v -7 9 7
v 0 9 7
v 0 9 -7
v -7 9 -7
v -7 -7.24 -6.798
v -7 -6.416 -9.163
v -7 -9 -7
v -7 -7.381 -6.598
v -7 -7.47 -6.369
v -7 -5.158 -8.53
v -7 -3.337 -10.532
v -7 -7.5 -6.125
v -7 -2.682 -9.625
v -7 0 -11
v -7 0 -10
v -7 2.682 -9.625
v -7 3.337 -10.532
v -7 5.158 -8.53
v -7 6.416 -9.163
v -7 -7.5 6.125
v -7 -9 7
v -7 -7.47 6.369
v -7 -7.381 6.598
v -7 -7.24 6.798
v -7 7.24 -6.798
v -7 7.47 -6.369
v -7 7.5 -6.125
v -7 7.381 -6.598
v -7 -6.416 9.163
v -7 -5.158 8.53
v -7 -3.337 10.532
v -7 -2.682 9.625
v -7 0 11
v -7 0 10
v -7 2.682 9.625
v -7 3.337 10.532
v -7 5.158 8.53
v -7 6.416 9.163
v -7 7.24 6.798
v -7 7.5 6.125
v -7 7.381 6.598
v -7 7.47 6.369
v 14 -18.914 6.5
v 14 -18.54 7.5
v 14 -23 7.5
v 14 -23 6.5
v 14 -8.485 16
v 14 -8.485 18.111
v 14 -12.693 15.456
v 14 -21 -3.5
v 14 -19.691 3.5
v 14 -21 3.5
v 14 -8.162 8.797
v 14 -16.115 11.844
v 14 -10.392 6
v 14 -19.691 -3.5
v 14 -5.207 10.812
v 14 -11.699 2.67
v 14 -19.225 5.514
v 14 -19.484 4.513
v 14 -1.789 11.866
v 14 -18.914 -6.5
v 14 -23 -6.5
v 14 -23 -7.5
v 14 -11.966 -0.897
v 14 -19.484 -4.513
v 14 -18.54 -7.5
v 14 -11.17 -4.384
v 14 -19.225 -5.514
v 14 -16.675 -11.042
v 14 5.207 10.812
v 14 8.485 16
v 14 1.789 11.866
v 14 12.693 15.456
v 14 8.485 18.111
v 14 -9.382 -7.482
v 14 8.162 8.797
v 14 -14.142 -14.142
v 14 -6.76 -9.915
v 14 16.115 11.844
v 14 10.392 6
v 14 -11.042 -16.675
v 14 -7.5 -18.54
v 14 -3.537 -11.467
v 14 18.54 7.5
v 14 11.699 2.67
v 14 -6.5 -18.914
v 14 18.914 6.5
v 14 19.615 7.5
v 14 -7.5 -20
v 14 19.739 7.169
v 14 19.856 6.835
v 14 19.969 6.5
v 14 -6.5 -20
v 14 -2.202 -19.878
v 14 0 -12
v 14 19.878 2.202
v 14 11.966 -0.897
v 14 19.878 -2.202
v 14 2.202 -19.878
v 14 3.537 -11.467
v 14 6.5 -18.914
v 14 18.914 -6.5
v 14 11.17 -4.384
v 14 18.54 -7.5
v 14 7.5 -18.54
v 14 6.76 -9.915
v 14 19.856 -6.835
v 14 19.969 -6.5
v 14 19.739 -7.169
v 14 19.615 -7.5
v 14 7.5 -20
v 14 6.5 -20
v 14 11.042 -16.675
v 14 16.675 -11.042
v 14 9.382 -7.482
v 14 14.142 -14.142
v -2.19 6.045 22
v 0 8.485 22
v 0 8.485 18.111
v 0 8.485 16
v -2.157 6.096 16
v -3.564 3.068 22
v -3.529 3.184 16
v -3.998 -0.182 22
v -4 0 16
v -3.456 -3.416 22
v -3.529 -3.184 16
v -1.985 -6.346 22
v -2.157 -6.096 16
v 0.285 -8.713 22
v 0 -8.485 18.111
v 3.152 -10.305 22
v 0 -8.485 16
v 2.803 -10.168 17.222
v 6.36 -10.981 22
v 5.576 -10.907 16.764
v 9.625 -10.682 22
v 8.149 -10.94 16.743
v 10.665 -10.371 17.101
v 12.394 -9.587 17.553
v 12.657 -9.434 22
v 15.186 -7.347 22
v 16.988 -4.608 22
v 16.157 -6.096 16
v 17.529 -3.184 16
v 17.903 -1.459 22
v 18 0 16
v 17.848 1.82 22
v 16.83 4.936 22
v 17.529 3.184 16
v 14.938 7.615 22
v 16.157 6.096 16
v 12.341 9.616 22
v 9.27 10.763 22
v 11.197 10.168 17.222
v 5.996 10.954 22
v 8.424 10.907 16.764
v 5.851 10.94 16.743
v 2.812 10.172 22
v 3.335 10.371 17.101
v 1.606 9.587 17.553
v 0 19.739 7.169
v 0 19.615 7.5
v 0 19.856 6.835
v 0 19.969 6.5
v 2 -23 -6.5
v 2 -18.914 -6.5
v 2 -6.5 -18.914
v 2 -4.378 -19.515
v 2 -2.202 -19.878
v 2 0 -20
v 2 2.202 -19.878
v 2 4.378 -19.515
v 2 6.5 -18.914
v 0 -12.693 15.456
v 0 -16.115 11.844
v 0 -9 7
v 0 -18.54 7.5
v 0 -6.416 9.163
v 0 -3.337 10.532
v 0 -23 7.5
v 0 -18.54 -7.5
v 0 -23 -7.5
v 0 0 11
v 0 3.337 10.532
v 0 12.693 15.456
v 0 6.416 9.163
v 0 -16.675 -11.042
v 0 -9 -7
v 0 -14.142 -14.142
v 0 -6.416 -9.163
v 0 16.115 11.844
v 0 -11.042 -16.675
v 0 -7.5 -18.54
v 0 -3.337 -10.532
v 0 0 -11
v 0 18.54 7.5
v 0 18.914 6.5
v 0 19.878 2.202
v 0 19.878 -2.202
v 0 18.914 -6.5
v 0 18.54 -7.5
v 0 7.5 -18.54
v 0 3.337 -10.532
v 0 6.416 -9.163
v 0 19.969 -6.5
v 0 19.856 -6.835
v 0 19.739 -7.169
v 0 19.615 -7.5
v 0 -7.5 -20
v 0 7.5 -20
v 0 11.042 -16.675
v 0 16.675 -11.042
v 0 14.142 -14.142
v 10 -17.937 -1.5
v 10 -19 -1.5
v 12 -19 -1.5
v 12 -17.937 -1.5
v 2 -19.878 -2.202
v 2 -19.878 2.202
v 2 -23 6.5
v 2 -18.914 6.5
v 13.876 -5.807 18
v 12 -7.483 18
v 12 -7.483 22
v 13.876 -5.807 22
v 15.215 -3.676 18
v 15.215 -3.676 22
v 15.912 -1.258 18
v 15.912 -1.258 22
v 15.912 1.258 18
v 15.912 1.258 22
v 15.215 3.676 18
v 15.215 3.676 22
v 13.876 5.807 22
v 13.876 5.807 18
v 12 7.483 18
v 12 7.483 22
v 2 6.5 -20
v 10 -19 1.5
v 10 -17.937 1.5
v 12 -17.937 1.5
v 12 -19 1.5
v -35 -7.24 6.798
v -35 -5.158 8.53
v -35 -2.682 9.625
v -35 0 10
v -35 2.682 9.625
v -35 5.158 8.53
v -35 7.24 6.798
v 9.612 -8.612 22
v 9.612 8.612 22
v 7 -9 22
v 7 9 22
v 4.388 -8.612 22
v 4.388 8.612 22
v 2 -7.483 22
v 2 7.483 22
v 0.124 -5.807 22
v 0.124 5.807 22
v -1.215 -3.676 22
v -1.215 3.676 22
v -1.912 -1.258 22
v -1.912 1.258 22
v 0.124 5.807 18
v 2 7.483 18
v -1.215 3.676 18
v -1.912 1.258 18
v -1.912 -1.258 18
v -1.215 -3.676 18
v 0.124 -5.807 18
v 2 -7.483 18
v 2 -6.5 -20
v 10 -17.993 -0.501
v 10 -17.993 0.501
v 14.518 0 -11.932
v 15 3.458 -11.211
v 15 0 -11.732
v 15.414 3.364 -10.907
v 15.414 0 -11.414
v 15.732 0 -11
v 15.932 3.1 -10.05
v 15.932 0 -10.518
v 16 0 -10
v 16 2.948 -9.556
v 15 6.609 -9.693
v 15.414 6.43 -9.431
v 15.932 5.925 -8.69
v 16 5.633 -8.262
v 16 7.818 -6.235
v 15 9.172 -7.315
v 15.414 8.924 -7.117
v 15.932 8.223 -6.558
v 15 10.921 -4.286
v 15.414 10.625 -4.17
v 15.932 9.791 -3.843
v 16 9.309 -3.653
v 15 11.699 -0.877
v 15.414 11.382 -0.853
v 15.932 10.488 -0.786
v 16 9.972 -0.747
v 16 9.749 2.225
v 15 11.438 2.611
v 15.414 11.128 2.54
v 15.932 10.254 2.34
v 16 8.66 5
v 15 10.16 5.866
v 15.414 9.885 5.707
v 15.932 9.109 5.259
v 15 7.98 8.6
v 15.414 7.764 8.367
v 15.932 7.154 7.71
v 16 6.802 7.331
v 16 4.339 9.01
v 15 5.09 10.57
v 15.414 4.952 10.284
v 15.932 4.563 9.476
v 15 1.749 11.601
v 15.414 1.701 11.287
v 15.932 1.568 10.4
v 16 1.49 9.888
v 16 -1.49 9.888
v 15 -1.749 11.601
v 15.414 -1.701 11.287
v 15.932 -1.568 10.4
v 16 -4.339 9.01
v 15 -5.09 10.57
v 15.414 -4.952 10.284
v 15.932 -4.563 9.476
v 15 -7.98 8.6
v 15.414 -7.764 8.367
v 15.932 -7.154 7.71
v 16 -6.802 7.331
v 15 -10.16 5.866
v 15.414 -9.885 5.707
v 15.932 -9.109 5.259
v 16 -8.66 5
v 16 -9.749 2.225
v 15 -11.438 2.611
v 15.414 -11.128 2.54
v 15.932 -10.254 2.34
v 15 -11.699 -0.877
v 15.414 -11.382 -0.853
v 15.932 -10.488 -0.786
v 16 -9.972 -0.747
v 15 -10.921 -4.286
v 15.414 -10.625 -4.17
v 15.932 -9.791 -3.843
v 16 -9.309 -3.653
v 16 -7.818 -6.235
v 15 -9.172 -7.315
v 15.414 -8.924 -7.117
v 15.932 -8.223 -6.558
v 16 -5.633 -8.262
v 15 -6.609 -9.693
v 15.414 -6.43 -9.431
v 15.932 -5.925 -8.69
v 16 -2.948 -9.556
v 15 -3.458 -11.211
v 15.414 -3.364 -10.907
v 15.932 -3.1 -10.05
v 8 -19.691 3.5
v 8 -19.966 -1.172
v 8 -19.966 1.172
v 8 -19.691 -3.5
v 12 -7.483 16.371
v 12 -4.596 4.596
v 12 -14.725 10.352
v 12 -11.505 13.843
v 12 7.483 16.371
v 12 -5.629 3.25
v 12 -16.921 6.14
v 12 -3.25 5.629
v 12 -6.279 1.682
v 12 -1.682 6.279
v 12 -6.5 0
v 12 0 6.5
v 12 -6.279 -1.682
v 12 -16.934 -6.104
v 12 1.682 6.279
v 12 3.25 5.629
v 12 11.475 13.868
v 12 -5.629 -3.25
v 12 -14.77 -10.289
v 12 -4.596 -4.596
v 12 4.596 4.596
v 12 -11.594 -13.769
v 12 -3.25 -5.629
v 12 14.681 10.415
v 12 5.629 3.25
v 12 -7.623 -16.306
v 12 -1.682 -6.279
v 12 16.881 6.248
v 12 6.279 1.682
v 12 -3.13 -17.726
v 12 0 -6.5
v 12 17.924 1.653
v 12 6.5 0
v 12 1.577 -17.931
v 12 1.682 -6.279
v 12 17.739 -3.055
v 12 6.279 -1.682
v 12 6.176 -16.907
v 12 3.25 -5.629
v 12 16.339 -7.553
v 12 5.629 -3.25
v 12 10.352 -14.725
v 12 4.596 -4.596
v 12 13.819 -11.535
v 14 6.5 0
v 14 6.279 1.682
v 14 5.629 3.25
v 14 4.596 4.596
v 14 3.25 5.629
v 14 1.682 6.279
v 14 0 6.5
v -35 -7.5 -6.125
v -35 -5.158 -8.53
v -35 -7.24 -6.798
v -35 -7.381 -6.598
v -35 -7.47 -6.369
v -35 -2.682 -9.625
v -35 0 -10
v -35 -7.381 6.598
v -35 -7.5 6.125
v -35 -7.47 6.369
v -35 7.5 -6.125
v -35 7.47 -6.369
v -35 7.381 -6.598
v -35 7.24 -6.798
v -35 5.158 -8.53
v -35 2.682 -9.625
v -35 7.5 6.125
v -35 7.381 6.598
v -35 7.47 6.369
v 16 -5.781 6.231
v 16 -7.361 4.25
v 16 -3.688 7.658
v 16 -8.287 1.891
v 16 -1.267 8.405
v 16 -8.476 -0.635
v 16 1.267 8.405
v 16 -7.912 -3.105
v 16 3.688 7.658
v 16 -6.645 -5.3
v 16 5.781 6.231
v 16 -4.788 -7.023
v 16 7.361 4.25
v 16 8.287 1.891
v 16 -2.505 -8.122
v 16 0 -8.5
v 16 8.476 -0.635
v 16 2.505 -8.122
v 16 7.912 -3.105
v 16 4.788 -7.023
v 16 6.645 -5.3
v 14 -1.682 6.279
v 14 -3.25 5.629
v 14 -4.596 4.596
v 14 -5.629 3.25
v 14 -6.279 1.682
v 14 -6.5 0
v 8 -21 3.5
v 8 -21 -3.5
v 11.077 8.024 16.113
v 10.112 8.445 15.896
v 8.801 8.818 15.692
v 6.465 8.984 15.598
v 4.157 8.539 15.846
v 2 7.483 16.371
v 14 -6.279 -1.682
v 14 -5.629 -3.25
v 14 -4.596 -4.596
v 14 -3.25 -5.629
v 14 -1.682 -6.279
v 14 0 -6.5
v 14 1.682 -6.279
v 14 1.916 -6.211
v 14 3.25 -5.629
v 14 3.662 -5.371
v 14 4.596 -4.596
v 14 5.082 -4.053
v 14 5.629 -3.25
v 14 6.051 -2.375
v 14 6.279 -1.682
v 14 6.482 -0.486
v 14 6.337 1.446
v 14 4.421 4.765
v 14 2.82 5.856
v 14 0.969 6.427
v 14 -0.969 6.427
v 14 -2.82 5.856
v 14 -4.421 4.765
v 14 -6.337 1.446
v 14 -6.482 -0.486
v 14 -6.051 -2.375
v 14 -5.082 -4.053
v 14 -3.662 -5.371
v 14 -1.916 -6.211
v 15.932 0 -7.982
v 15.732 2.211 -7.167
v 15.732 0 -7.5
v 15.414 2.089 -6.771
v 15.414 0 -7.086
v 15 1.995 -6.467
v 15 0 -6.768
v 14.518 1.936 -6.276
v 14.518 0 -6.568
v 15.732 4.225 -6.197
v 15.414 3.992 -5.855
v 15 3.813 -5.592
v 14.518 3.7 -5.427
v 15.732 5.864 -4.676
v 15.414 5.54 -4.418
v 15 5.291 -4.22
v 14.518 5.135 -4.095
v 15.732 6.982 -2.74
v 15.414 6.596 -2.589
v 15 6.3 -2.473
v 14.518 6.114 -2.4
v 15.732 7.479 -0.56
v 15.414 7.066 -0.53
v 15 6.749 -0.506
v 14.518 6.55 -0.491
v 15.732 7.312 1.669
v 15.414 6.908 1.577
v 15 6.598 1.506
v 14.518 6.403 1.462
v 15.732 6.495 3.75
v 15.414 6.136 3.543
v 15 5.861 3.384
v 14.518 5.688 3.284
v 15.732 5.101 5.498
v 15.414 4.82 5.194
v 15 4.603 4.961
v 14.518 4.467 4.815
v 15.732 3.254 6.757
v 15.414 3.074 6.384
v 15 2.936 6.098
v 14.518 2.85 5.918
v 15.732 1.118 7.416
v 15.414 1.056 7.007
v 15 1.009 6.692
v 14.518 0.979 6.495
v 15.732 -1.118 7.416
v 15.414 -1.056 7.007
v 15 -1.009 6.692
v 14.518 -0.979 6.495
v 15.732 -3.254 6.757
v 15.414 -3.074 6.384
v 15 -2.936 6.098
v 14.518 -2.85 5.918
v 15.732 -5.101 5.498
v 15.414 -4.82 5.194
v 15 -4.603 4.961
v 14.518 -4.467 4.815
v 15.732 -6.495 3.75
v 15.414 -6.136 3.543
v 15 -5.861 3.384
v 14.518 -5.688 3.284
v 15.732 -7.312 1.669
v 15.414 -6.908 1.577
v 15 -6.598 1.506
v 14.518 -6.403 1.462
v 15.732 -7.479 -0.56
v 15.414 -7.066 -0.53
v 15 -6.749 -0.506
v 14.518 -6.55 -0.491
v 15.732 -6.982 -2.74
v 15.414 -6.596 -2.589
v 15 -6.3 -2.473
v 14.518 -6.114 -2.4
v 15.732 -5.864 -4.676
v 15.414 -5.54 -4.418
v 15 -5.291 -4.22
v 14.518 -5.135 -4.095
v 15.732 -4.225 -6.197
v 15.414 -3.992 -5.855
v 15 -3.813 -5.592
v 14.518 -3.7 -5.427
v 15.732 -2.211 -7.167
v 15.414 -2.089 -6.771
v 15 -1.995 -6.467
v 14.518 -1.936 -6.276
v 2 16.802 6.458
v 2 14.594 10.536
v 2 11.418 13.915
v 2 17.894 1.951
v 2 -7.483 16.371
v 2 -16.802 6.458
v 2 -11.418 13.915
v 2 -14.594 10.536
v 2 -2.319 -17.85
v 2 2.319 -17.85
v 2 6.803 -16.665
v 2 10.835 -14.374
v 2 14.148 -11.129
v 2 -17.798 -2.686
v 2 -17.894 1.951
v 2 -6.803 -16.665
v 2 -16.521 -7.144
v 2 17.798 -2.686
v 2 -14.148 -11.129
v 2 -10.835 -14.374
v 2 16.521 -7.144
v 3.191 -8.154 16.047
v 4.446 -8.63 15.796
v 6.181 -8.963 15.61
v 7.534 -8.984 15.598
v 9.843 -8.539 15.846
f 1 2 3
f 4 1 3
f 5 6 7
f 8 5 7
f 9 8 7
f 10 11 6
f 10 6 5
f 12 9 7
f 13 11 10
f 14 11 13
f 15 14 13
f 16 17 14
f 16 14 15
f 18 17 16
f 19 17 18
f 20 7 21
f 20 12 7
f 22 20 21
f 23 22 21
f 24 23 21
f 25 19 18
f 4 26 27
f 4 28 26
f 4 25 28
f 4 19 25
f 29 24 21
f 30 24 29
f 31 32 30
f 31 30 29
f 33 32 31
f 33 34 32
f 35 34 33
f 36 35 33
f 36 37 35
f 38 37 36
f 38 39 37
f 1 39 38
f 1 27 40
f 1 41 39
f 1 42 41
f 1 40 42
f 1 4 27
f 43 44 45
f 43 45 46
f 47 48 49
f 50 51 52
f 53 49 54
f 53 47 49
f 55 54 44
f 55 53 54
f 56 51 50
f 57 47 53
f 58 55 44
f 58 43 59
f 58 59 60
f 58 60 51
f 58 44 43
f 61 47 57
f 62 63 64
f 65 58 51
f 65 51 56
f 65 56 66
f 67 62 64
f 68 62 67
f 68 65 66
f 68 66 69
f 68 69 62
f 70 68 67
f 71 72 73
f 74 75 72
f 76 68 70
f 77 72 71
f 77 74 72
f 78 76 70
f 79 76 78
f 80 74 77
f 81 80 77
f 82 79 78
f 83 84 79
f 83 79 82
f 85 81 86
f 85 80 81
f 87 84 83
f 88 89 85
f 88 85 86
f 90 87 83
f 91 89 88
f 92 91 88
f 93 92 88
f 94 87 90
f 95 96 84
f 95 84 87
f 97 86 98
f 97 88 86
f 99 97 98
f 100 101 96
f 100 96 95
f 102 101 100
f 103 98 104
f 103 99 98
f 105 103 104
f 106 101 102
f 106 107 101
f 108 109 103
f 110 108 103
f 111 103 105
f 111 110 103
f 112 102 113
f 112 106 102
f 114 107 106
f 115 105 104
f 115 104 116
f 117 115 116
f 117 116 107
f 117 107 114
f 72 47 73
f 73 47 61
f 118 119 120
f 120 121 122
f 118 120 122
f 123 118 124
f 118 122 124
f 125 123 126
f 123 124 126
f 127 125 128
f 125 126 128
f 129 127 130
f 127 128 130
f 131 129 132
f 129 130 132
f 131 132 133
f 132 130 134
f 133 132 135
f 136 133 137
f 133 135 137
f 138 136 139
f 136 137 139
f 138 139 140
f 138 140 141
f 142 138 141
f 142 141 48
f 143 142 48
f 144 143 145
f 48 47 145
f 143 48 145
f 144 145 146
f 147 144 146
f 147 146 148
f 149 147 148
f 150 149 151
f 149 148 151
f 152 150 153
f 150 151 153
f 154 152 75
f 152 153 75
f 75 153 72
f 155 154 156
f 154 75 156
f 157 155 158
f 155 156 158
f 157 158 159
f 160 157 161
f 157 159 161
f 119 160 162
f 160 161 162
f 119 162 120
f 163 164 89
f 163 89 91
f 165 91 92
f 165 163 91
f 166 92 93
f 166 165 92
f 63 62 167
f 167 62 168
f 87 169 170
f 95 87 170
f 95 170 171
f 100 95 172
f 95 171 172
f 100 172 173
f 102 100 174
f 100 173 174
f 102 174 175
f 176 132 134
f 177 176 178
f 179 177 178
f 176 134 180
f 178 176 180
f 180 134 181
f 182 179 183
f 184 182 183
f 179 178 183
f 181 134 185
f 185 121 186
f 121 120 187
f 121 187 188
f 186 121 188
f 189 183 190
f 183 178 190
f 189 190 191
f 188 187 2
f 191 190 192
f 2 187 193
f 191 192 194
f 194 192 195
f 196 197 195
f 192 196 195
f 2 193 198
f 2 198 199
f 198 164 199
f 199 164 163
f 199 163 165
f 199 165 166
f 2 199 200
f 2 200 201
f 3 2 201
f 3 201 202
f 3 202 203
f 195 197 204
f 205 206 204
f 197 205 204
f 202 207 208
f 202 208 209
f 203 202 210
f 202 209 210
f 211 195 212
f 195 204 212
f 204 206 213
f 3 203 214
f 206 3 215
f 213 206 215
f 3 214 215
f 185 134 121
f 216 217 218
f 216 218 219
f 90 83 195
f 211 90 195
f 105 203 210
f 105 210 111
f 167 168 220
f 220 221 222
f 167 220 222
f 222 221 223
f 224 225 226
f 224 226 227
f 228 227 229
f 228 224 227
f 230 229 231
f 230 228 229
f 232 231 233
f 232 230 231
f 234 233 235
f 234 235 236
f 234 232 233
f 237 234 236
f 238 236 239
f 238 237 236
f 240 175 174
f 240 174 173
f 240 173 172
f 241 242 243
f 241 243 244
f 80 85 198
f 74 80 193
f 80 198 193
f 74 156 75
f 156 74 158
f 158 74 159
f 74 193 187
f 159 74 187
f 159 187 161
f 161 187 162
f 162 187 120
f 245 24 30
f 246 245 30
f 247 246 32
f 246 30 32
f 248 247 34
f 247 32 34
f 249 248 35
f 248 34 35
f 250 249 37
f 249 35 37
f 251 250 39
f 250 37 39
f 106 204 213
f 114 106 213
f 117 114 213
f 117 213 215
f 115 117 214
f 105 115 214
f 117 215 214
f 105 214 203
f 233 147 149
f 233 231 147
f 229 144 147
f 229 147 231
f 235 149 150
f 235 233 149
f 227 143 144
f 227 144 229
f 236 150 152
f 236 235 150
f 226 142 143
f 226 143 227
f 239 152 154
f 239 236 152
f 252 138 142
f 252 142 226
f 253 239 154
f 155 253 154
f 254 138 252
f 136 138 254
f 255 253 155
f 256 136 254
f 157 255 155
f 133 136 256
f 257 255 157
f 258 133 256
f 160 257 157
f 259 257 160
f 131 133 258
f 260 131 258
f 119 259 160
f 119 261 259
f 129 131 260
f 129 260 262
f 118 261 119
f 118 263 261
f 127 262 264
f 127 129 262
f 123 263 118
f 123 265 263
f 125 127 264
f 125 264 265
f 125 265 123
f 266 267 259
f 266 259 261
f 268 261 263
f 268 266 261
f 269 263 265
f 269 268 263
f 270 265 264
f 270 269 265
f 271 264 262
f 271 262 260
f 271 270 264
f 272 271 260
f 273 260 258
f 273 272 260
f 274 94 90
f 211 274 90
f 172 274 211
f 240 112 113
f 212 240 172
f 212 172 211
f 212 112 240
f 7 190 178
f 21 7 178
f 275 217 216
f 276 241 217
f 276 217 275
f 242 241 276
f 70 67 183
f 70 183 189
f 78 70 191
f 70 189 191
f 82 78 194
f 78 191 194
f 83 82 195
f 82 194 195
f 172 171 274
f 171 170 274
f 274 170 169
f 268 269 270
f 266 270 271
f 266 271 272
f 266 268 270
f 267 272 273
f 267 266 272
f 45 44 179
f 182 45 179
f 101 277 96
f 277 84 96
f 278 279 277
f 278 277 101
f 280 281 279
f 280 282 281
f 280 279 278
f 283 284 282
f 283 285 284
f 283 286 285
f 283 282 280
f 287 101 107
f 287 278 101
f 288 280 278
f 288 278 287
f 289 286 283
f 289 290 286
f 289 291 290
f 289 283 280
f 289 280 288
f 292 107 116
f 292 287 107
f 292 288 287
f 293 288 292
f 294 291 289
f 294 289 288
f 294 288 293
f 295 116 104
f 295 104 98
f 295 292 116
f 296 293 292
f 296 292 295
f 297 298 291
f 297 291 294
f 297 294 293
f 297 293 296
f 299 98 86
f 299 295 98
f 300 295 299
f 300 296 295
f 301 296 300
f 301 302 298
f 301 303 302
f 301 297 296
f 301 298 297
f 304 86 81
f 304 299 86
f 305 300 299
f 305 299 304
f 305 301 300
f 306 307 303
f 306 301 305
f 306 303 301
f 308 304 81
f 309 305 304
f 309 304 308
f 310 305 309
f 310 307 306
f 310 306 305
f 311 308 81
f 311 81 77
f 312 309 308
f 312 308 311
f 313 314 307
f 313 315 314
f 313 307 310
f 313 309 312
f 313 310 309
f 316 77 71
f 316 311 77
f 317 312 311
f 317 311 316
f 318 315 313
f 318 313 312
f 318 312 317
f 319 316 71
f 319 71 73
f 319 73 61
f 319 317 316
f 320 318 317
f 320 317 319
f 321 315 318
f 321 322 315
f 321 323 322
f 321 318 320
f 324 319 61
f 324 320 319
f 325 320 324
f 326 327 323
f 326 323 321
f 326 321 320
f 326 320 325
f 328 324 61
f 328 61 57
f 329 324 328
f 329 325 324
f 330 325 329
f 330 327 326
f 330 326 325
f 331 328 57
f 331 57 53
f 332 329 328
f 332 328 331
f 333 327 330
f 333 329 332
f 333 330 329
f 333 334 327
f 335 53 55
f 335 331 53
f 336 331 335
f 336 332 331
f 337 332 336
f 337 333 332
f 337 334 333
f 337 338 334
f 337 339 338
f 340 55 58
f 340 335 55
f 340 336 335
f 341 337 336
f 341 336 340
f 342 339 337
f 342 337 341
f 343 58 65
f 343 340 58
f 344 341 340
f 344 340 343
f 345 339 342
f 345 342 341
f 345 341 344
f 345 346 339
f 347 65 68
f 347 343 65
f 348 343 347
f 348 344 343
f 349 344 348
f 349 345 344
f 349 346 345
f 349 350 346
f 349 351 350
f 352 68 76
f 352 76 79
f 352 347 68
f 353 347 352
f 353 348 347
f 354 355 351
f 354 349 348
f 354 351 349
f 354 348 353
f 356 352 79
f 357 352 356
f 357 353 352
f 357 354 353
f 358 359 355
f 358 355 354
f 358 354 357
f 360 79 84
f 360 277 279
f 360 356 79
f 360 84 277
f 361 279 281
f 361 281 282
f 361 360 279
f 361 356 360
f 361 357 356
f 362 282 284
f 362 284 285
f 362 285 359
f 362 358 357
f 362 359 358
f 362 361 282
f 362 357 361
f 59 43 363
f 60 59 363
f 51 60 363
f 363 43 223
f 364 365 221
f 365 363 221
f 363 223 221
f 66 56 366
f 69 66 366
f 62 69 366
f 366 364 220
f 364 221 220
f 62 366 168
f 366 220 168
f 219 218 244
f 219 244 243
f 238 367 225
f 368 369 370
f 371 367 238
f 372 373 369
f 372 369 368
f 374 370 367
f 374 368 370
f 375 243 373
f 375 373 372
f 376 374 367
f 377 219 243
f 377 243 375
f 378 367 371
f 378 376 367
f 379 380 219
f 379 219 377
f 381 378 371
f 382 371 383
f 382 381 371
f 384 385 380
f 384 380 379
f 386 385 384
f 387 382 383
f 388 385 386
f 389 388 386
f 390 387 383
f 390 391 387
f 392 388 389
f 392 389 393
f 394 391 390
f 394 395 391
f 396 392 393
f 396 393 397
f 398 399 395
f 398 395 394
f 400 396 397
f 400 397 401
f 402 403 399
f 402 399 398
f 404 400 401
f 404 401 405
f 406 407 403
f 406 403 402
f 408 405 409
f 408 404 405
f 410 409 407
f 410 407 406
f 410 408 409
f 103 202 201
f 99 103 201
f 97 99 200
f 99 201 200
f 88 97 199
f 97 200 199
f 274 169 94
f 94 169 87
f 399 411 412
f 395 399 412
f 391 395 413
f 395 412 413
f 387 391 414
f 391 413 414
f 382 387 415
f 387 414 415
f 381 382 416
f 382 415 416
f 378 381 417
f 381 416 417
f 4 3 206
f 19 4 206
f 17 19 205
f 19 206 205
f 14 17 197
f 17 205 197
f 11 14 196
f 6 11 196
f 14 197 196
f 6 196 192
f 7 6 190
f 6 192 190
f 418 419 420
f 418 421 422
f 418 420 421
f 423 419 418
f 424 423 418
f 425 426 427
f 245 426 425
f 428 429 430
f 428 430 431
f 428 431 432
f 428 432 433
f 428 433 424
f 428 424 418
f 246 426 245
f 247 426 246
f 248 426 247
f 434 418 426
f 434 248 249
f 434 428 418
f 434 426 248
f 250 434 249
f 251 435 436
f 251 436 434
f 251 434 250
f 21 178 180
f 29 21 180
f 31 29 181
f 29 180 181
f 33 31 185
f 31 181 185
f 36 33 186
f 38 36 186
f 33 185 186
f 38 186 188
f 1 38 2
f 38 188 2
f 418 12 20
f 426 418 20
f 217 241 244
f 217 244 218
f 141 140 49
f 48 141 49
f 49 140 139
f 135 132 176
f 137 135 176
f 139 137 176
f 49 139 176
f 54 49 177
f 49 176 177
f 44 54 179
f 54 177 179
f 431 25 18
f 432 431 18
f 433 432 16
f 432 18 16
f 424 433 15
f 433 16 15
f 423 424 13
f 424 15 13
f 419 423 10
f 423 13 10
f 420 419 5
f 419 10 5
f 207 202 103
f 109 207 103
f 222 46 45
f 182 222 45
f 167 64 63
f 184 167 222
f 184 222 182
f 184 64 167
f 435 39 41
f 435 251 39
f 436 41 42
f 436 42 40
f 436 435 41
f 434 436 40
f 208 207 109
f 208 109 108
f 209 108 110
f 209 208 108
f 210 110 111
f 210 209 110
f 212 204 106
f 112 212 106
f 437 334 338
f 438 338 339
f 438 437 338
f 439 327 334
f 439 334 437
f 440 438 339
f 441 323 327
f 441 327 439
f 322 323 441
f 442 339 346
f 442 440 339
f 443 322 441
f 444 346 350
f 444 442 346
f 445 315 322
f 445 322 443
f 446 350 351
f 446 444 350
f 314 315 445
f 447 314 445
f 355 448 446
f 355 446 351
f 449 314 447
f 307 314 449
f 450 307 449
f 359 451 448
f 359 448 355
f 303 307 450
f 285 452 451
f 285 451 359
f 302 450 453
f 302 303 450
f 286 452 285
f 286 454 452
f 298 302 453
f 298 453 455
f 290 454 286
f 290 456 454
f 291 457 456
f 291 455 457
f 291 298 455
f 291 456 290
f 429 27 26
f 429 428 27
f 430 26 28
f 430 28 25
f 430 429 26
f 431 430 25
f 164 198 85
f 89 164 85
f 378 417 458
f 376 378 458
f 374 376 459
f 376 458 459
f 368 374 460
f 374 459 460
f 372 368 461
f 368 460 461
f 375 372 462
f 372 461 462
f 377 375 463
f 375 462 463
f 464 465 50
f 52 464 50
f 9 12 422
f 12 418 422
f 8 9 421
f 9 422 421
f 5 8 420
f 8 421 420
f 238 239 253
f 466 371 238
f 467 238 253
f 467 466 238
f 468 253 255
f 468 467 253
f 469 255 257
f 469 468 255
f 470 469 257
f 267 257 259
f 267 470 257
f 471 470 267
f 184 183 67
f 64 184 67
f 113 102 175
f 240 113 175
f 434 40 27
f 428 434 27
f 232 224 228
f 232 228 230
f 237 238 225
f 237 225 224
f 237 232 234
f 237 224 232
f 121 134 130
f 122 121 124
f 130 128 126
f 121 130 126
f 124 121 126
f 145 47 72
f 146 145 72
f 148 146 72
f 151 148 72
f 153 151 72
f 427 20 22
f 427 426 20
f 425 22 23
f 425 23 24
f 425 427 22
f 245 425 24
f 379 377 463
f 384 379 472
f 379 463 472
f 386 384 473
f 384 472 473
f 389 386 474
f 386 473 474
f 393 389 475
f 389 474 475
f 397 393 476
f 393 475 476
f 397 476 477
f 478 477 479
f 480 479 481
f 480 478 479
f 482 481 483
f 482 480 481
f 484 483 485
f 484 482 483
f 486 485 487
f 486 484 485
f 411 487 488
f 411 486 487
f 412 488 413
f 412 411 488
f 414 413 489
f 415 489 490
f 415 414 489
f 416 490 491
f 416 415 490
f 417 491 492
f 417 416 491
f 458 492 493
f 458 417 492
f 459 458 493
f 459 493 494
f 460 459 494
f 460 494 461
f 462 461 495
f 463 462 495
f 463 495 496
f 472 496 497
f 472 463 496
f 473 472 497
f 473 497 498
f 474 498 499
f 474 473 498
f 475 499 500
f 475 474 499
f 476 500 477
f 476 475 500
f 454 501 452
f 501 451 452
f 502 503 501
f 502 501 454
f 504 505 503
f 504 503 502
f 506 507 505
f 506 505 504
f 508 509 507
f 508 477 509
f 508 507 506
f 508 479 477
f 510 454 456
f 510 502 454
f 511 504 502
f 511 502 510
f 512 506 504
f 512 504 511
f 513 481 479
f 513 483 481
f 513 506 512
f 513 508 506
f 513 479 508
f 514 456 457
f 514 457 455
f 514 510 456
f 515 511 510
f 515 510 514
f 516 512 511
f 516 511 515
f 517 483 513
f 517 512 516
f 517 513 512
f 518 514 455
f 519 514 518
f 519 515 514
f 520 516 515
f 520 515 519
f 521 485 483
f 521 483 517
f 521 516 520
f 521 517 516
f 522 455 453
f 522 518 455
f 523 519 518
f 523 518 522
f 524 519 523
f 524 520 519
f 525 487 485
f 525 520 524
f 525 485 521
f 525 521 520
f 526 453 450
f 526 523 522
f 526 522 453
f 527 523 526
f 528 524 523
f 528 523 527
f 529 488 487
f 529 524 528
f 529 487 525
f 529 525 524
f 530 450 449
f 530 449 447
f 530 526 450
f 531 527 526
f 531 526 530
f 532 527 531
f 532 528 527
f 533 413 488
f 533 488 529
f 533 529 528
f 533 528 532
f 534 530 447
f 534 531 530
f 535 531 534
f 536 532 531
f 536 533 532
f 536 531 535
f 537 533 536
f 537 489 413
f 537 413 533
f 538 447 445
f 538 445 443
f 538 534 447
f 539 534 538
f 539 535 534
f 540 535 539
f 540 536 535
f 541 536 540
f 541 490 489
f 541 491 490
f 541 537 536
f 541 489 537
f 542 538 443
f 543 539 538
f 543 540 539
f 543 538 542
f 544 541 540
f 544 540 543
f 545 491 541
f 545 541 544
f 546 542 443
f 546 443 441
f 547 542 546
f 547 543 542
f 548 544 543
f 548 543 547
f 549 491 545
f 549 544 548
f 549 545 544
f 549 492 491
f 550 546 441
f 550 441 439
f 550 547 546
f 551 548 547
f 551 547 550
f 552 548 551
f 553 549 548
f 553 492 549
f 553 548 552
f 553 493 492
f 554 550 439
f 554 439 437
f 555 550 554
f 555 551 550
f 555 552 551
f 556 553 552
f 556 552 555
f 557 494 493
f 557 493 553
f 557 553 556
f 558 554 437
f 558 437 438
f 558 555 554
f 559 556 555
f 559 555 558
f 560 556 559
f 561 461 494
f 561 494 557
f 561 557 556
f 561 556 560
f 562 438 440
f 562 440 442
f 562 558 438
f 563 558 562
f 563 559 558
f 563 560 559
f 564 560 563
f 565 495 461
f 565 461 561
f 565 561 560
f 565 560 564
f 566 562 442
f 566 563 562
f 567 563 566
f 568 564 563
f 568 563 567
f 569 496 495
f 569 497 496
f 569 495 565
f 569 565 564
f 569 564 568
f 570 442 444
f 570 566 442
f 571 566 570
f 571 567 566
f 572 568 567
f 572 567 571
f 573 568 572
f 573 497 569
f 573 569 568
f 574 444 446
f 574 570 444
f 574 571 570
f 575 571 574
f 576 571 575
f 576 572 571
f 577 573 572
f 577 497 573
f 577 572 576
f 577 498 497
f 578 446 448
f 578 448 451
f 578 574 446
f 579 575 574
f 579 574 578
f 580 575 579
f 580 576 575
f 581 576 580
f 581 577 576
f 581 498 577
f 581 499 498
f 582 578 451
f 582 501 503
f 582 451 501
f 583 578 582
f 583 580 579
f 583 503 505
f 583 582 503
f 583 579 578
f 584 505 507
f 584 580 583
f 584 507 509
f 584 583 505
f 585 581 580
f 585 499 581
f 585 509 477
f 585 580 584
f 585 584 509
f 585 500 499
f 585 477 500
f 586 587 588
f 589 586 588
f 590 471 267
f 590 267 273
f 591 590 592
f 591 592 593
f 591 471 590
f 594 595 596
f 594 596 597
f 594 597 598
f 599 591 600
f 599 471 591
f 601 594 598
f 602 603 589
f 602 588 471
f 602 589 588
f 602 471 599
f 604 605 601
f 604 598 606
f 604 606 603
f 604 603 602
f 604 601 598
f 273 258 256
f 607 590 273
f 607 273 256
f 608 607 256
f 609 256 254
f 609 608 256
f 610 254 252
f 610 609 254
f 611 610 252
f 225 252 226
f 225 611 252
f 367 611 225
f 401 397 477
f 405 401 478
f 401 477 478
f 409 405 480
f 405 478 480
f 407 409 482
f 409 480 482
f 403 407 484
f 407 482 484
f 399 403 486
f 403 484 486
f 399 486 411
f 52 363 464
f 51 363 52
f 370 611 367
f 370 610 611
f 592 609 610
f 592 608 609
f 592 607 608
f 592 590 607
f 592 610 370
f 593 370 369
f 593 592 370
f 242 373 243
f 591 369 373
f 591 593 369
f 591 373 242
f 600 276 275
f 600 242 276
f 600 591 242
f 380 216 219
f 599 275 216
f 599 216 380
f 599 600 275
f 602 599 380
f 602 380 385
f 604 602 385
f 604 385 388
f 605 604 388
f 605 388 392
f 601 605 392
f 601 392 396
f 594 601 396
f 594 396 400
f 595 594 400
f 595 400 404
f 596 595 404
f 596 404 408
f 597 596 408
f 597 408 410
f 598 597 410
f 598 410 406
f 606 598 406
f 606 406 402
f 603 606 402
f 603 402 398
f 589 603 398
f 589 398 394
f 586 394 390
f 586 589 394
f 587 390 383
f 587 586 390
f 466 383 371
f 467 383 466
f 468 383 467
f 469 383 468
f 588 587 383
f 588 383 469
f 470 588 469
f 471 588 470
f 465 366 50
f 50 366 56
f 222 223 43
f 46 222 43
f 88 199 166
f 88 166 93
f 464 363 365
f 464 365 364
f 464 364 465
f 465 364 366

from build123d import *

# Parameters (mm, degrees)
SKETCH2_R                = 20
BOSS_EXTRUDE1_DEPTH      = 14
SKETCH3_R                = 12
SKETCH3_R_2              = 6.5
EXTRUDE_THIN1_DEPTH      = 2
FILLET1_R                = 2
BOSS_EXTRUDE4_REACH      = 34.496
BOSS_EXTRUDE4_END_RADIUS = 21
SKETCH4_W                = 14
SKETCH4_H                = 1
BOSS_EXTRUDE5_DEPTH      = 23
SKETCH6_W                = 6
SKETCH6_H                = 7
BOSS_EXTRUDE6_DEPTH      = 21
BOSS_EXTRUDE7_DEPTH      = 20
BOSS_EXTRUDE8_START      = 16
SKETCH8_R                = 11
BOSS_EXTRUDE8_DEPTH      = 6
SHELL1_START             = 10
SHELL1_DEPTH             = 2
SHELL1_START_2           = -1.5
SHELL1_2_DEPTH           = 23.5
SHELL1_START_3           = 18
SHELL1_3_DEPTH           = 4
SHELL1_START_4           = 2
SHELL1_4_DEPTH           = 10
CUT_EXTRUDE1_REACH       = 38.565
BOSS_EXTRUDE9_DEPTH      = 7
BOSS_EXTRUDE10_DEPTH     = 28
FILLET2_R                = 1


with BuildPart() as part:
    # Sketch2 → Boss-Extrude1 (new body)
    with BuildSketch(Plane(origin=(0, 0, 0), x_dir=(0, 0, -1), z_dir=(1, 0, 0))):
        Circle(SKETCH2_R)
    extrude(amount=BOSS_EXTRUDE1_DEPTH)

    # Sketch3 → Extrude-Thin1 (add)
    with BuildSketch(Plane(origin=(14, 0, 0), x_dir=(0, 0, -1), z_dir=(1, 0, 0))):
        Circle(SKETCH3_R)
        Circle(SKETCH3_R_2, mode=Mode.SUBTRACT)
    extrude(amount=EXTRUDE_THIN1_DEPTH)

    # Fillet1
    fillet1_edges = [part.edges().sort_by_distance(p)[0] for p in [
        (16, 0, 12),
        (16, 0, 6.5),
    ]]
    fillet(fillet1_edges, radius=FILLET1_R - 0.0001)  # a hair under: the kernel refuses the full size

    # Boss-Extrude4: up to this cylinder (the profile starts inside it)
    boss_extrude4_end = Plane(origin=(7, 0, 0), z_dir=(-1, 0, 0)) * Cylinder(BOSS_EXTRUDE4_END_RADIUS, 111.992, mode=Mode.PRIVATE)
    # Sketch4 → Boss-Extrude4 (add, up to the surface)
    with BuildSketch(Plane(origin=(0, 0, 0), x_dir=(1, 0, 0), z_dir=(0, 1, 0)), mode=Mode.PRIVATE) as boss_extrude4_sk1:
        with Locations((7, 7)):
            Rectangle(SKETCH4_W, SKETCH4_H)
    boss_extrude4_tool1 = extrude(boss_extrude4_sk1.sketch, amount=BOSS_EXTRUDE4_REACH, mode=Mode.PRIVATE) & boss_extrude4_end
    add(boss_extrude4_tool1.solids().sort_by_distance((7, 0, -7))[0])
    # Sketch4 → Boss-Extrude4 (add, up to the surface)
    with BuildSketch(Plane(origin=(0, 0, 0), x_dir=(1, 0, 0), z_dir=(0, 1, 0)), mode=Mode.PRIVATE) as boss_extrude4_sk2:
        with Locations((7, -7)):
            Rectangle(SKETCH4_W, SKETCH4_H)
    boss_extrude4_tool2 = extrude(boss_extrude4_sk2.sketch, amount=BOSS_EXTRUDE4_REACH, mode=Mode.PRIVATE) & boss_extrude4_end
    add(boss_extrude4_tool2.solids().sort_by_distance((7, 0, 7))[0])

    # Sketch5 → Boss-Extrude5 (add)
    with BuildSketch(Plane(origin=(0, 0, 0), x_dir=(1, 0, 0), z_dir=(0, 1, 0))):
        Polygon((2, 6.5), (2, -6.5), (14, -6.5), (14, -7.5), (0, -7.5), (0, 7.5), (14, 7.5), (14, 6.5), align=None)
    extrude(amount=-BOSS_EXTRUDE5_DEPTH)

    # Sketch6 → Boss-Extrude6 (add)
    with BuildSketch(Plane(origin=(0, 0, 0), x_dir=(1, 0, 0), z_dir=(0, 1, 0))):
        with Locations((11, 0)):
            Rectangle(SKETCH6_W, SKETCH6_H)
    extrude(amount=-BOSS_EXTRUDE6_DEPTH)

    # Sketch7 → Boss-Extrude7 (add)
    with BuildSketch(Plane.XY):
        Polygon((0, 7.5), (14, 7.5), (14, 6.5), (2, 6.5), (2, -6.5), (14, -6.5), (14, -7.5), (0, -7.5), align=None)
    extrude(amount=-BOSS_EXTRUDE7_DEPTH)

    # Sketch8 → Boss-Extrude8 (add)
    with BuildSketch(Plane.XY.offset(BOSS_EXTRUDE8_START)):
        with Locations(Location((7, 0, 0), (0, 0, 129.521196359))):
            Circle(SKETCH8_R)
    extrude(amount=BOSS_EXTRUDE8_DEPTH)

    # Shell1: read off the stored shape, not the designer's step
    # Shell1 outline → Shell1 (cut)
    with BuildSketch(Plane.YZ.offset(SHELL1_START)):
        with BuildLine():
            Line((-19, -1.5), (-17.937391115, -1.5))
            ThreePointArc((-17.937391115, -1.5), (-18, 0), (-17.937391115, 1.5))
            Line((-17.937391115, 1.5), (-19, 1.5))
            Line((-19, 1.5), (-19, -1.5))
        make_face()
    extrude(amount=SHELL1_DEPTH, mode=Mode.SUBTRACT)

    # Shell1 2 outline → Shell1 2 (cut)
    with BuildSketch(Plane.XY.offset(SHELL1_START_2)):
        with BuildLine():
            Line((2, 7.483314774), (2, -7.483314774))
            ThreePointArc((2, -7.483314774), (7, -9), (12, -7.483314774))
            Line((12, -7.483314774), (12, 7.483314774))
            ThreePointArc((12, 7.483314774), (7, 9), (2, 7.483314774))
        make_face()
    extrude(amount=SHELL1_2_DEPTH, mode=Mode.SUBTRACT)

    # Shell1 3 outline → Shell1 3 (cut)
    with BuildSketch(Plane.XY.offset(SHELL1_START_3)):
        with BuildLine():
            ThreePointArc((2, 7.483314774), (-2, 0), (2, -7.483314774))
            Line((2, -7.483314774), (2, 7.483314774))
        make_face()
        with BuildLine():
            Line((12, 7.483314774), (12, -7.483314774))
            ThreePointArc((12, -7.483314774), (16, 0), (12, 7.483314774))
        make_face()
    extrude(amount=SHELL1_3_DEPTH, mode=Mode.SUBTRACT)

    # Shell1 4 outline → Shell1 4 (cut)
    with BuildSketch(Plane.YZ.offset(SHELL1_START_4)):
        with BuildLine():
            Line((7.483314774, 16.370705544), (3.91902534, 18))
            Line((3.91902534, 18), (-3.91902534, 18))
            Line((-3.91902534, 18), (-7.483314774, 16.370705544))
            ThreePointArc((-7.483314774, 16.370705544), (0, -18), (7.483314774, 16.370705544))
        make_face()
    extrude(amount=SHELL1_4_DEPTH, mode=Mode.SUBTRACT)

    # Sketch9 → Cut-Extrude1 (cut, up to next)
    with BuildSketch(Plane(origin=(14, 0, 0), x_dir=(0, 0, -1), z_dir=(1, 0, 0)), mode=Mode.PRIVATE) as cut_extrude1_sk1:
        with BuildLine():
            ThreePointArc((0, 6.5), (-4.596194078, 4.596194078), (-6.5, 0))
            ThreePointArc((-6.5, 0), (-4.596194078, -4.596194078), (0, -6.5))
            ThreePointArc((0, -6.5), (4.596194078, -4.596194078), (6.5, 0))
            ThreePointArc((6.5, 0), (4.596194078, 4.596194078), (0, 6.5))
        make_face()
    cut_extrude1_tool1 = extrude(cut_extrude1_sk1.sketch, amount=-CUT_EXTRUDE1_REACH, mode=Mode.PRIVATE) & part.part
    add(cut_extrude1_tool1.solids().sort_by_distance((14, 0, 0))[0], mode=Mode.SUBTRACT)

    # Sketch10 → Boss-Extrude9 (add)
    with BuildSketch(Plane.ZY):
        with BuildLine():
            Line((7, 9), (-7, 9))
            ThreePointArc((-7, 9), (-11, 0), (-7, -9))
            Line((-7, -9), (7, -9))
            ThreePointArc((7, -9), (11, 0), (7, 9))
        make_face()
    extrude(amount=BOSS_EXTRUDE9_DEPTH)

    # Sketch11 → Boss-Extrude10 (add)
    with BuildSketch(Plane.ZY.offset(7)):
        with BuildLine():
            Line((-6.5, -7.5), (6.5, -7.5))
            ThreePointArc((6.5, -7.5), (10, 0), (6.5, 7.5))
            Line((6.5, 7.5), (-6.5, 7.5))
            ThreePointArc((-6.5, 7.5), (-10, 0), (-6.5, -7.5))
        make_face()
    extrude(amount=BOSS_EXTRUDE10_DEPTH)

    # Fillet2
    fillet2_edges = [part.edges().sort_by_distance(p)[0] for p in [
        (-21, -7.5, 6.5),
        (-21, 7.5, 6.5),
        (-21, 7.5, -6.5),
        (-21, -7.5, -6.5),
    ]]
    fillet(fillet2_edges, radius=FILLET2_R)


solid = part.part
